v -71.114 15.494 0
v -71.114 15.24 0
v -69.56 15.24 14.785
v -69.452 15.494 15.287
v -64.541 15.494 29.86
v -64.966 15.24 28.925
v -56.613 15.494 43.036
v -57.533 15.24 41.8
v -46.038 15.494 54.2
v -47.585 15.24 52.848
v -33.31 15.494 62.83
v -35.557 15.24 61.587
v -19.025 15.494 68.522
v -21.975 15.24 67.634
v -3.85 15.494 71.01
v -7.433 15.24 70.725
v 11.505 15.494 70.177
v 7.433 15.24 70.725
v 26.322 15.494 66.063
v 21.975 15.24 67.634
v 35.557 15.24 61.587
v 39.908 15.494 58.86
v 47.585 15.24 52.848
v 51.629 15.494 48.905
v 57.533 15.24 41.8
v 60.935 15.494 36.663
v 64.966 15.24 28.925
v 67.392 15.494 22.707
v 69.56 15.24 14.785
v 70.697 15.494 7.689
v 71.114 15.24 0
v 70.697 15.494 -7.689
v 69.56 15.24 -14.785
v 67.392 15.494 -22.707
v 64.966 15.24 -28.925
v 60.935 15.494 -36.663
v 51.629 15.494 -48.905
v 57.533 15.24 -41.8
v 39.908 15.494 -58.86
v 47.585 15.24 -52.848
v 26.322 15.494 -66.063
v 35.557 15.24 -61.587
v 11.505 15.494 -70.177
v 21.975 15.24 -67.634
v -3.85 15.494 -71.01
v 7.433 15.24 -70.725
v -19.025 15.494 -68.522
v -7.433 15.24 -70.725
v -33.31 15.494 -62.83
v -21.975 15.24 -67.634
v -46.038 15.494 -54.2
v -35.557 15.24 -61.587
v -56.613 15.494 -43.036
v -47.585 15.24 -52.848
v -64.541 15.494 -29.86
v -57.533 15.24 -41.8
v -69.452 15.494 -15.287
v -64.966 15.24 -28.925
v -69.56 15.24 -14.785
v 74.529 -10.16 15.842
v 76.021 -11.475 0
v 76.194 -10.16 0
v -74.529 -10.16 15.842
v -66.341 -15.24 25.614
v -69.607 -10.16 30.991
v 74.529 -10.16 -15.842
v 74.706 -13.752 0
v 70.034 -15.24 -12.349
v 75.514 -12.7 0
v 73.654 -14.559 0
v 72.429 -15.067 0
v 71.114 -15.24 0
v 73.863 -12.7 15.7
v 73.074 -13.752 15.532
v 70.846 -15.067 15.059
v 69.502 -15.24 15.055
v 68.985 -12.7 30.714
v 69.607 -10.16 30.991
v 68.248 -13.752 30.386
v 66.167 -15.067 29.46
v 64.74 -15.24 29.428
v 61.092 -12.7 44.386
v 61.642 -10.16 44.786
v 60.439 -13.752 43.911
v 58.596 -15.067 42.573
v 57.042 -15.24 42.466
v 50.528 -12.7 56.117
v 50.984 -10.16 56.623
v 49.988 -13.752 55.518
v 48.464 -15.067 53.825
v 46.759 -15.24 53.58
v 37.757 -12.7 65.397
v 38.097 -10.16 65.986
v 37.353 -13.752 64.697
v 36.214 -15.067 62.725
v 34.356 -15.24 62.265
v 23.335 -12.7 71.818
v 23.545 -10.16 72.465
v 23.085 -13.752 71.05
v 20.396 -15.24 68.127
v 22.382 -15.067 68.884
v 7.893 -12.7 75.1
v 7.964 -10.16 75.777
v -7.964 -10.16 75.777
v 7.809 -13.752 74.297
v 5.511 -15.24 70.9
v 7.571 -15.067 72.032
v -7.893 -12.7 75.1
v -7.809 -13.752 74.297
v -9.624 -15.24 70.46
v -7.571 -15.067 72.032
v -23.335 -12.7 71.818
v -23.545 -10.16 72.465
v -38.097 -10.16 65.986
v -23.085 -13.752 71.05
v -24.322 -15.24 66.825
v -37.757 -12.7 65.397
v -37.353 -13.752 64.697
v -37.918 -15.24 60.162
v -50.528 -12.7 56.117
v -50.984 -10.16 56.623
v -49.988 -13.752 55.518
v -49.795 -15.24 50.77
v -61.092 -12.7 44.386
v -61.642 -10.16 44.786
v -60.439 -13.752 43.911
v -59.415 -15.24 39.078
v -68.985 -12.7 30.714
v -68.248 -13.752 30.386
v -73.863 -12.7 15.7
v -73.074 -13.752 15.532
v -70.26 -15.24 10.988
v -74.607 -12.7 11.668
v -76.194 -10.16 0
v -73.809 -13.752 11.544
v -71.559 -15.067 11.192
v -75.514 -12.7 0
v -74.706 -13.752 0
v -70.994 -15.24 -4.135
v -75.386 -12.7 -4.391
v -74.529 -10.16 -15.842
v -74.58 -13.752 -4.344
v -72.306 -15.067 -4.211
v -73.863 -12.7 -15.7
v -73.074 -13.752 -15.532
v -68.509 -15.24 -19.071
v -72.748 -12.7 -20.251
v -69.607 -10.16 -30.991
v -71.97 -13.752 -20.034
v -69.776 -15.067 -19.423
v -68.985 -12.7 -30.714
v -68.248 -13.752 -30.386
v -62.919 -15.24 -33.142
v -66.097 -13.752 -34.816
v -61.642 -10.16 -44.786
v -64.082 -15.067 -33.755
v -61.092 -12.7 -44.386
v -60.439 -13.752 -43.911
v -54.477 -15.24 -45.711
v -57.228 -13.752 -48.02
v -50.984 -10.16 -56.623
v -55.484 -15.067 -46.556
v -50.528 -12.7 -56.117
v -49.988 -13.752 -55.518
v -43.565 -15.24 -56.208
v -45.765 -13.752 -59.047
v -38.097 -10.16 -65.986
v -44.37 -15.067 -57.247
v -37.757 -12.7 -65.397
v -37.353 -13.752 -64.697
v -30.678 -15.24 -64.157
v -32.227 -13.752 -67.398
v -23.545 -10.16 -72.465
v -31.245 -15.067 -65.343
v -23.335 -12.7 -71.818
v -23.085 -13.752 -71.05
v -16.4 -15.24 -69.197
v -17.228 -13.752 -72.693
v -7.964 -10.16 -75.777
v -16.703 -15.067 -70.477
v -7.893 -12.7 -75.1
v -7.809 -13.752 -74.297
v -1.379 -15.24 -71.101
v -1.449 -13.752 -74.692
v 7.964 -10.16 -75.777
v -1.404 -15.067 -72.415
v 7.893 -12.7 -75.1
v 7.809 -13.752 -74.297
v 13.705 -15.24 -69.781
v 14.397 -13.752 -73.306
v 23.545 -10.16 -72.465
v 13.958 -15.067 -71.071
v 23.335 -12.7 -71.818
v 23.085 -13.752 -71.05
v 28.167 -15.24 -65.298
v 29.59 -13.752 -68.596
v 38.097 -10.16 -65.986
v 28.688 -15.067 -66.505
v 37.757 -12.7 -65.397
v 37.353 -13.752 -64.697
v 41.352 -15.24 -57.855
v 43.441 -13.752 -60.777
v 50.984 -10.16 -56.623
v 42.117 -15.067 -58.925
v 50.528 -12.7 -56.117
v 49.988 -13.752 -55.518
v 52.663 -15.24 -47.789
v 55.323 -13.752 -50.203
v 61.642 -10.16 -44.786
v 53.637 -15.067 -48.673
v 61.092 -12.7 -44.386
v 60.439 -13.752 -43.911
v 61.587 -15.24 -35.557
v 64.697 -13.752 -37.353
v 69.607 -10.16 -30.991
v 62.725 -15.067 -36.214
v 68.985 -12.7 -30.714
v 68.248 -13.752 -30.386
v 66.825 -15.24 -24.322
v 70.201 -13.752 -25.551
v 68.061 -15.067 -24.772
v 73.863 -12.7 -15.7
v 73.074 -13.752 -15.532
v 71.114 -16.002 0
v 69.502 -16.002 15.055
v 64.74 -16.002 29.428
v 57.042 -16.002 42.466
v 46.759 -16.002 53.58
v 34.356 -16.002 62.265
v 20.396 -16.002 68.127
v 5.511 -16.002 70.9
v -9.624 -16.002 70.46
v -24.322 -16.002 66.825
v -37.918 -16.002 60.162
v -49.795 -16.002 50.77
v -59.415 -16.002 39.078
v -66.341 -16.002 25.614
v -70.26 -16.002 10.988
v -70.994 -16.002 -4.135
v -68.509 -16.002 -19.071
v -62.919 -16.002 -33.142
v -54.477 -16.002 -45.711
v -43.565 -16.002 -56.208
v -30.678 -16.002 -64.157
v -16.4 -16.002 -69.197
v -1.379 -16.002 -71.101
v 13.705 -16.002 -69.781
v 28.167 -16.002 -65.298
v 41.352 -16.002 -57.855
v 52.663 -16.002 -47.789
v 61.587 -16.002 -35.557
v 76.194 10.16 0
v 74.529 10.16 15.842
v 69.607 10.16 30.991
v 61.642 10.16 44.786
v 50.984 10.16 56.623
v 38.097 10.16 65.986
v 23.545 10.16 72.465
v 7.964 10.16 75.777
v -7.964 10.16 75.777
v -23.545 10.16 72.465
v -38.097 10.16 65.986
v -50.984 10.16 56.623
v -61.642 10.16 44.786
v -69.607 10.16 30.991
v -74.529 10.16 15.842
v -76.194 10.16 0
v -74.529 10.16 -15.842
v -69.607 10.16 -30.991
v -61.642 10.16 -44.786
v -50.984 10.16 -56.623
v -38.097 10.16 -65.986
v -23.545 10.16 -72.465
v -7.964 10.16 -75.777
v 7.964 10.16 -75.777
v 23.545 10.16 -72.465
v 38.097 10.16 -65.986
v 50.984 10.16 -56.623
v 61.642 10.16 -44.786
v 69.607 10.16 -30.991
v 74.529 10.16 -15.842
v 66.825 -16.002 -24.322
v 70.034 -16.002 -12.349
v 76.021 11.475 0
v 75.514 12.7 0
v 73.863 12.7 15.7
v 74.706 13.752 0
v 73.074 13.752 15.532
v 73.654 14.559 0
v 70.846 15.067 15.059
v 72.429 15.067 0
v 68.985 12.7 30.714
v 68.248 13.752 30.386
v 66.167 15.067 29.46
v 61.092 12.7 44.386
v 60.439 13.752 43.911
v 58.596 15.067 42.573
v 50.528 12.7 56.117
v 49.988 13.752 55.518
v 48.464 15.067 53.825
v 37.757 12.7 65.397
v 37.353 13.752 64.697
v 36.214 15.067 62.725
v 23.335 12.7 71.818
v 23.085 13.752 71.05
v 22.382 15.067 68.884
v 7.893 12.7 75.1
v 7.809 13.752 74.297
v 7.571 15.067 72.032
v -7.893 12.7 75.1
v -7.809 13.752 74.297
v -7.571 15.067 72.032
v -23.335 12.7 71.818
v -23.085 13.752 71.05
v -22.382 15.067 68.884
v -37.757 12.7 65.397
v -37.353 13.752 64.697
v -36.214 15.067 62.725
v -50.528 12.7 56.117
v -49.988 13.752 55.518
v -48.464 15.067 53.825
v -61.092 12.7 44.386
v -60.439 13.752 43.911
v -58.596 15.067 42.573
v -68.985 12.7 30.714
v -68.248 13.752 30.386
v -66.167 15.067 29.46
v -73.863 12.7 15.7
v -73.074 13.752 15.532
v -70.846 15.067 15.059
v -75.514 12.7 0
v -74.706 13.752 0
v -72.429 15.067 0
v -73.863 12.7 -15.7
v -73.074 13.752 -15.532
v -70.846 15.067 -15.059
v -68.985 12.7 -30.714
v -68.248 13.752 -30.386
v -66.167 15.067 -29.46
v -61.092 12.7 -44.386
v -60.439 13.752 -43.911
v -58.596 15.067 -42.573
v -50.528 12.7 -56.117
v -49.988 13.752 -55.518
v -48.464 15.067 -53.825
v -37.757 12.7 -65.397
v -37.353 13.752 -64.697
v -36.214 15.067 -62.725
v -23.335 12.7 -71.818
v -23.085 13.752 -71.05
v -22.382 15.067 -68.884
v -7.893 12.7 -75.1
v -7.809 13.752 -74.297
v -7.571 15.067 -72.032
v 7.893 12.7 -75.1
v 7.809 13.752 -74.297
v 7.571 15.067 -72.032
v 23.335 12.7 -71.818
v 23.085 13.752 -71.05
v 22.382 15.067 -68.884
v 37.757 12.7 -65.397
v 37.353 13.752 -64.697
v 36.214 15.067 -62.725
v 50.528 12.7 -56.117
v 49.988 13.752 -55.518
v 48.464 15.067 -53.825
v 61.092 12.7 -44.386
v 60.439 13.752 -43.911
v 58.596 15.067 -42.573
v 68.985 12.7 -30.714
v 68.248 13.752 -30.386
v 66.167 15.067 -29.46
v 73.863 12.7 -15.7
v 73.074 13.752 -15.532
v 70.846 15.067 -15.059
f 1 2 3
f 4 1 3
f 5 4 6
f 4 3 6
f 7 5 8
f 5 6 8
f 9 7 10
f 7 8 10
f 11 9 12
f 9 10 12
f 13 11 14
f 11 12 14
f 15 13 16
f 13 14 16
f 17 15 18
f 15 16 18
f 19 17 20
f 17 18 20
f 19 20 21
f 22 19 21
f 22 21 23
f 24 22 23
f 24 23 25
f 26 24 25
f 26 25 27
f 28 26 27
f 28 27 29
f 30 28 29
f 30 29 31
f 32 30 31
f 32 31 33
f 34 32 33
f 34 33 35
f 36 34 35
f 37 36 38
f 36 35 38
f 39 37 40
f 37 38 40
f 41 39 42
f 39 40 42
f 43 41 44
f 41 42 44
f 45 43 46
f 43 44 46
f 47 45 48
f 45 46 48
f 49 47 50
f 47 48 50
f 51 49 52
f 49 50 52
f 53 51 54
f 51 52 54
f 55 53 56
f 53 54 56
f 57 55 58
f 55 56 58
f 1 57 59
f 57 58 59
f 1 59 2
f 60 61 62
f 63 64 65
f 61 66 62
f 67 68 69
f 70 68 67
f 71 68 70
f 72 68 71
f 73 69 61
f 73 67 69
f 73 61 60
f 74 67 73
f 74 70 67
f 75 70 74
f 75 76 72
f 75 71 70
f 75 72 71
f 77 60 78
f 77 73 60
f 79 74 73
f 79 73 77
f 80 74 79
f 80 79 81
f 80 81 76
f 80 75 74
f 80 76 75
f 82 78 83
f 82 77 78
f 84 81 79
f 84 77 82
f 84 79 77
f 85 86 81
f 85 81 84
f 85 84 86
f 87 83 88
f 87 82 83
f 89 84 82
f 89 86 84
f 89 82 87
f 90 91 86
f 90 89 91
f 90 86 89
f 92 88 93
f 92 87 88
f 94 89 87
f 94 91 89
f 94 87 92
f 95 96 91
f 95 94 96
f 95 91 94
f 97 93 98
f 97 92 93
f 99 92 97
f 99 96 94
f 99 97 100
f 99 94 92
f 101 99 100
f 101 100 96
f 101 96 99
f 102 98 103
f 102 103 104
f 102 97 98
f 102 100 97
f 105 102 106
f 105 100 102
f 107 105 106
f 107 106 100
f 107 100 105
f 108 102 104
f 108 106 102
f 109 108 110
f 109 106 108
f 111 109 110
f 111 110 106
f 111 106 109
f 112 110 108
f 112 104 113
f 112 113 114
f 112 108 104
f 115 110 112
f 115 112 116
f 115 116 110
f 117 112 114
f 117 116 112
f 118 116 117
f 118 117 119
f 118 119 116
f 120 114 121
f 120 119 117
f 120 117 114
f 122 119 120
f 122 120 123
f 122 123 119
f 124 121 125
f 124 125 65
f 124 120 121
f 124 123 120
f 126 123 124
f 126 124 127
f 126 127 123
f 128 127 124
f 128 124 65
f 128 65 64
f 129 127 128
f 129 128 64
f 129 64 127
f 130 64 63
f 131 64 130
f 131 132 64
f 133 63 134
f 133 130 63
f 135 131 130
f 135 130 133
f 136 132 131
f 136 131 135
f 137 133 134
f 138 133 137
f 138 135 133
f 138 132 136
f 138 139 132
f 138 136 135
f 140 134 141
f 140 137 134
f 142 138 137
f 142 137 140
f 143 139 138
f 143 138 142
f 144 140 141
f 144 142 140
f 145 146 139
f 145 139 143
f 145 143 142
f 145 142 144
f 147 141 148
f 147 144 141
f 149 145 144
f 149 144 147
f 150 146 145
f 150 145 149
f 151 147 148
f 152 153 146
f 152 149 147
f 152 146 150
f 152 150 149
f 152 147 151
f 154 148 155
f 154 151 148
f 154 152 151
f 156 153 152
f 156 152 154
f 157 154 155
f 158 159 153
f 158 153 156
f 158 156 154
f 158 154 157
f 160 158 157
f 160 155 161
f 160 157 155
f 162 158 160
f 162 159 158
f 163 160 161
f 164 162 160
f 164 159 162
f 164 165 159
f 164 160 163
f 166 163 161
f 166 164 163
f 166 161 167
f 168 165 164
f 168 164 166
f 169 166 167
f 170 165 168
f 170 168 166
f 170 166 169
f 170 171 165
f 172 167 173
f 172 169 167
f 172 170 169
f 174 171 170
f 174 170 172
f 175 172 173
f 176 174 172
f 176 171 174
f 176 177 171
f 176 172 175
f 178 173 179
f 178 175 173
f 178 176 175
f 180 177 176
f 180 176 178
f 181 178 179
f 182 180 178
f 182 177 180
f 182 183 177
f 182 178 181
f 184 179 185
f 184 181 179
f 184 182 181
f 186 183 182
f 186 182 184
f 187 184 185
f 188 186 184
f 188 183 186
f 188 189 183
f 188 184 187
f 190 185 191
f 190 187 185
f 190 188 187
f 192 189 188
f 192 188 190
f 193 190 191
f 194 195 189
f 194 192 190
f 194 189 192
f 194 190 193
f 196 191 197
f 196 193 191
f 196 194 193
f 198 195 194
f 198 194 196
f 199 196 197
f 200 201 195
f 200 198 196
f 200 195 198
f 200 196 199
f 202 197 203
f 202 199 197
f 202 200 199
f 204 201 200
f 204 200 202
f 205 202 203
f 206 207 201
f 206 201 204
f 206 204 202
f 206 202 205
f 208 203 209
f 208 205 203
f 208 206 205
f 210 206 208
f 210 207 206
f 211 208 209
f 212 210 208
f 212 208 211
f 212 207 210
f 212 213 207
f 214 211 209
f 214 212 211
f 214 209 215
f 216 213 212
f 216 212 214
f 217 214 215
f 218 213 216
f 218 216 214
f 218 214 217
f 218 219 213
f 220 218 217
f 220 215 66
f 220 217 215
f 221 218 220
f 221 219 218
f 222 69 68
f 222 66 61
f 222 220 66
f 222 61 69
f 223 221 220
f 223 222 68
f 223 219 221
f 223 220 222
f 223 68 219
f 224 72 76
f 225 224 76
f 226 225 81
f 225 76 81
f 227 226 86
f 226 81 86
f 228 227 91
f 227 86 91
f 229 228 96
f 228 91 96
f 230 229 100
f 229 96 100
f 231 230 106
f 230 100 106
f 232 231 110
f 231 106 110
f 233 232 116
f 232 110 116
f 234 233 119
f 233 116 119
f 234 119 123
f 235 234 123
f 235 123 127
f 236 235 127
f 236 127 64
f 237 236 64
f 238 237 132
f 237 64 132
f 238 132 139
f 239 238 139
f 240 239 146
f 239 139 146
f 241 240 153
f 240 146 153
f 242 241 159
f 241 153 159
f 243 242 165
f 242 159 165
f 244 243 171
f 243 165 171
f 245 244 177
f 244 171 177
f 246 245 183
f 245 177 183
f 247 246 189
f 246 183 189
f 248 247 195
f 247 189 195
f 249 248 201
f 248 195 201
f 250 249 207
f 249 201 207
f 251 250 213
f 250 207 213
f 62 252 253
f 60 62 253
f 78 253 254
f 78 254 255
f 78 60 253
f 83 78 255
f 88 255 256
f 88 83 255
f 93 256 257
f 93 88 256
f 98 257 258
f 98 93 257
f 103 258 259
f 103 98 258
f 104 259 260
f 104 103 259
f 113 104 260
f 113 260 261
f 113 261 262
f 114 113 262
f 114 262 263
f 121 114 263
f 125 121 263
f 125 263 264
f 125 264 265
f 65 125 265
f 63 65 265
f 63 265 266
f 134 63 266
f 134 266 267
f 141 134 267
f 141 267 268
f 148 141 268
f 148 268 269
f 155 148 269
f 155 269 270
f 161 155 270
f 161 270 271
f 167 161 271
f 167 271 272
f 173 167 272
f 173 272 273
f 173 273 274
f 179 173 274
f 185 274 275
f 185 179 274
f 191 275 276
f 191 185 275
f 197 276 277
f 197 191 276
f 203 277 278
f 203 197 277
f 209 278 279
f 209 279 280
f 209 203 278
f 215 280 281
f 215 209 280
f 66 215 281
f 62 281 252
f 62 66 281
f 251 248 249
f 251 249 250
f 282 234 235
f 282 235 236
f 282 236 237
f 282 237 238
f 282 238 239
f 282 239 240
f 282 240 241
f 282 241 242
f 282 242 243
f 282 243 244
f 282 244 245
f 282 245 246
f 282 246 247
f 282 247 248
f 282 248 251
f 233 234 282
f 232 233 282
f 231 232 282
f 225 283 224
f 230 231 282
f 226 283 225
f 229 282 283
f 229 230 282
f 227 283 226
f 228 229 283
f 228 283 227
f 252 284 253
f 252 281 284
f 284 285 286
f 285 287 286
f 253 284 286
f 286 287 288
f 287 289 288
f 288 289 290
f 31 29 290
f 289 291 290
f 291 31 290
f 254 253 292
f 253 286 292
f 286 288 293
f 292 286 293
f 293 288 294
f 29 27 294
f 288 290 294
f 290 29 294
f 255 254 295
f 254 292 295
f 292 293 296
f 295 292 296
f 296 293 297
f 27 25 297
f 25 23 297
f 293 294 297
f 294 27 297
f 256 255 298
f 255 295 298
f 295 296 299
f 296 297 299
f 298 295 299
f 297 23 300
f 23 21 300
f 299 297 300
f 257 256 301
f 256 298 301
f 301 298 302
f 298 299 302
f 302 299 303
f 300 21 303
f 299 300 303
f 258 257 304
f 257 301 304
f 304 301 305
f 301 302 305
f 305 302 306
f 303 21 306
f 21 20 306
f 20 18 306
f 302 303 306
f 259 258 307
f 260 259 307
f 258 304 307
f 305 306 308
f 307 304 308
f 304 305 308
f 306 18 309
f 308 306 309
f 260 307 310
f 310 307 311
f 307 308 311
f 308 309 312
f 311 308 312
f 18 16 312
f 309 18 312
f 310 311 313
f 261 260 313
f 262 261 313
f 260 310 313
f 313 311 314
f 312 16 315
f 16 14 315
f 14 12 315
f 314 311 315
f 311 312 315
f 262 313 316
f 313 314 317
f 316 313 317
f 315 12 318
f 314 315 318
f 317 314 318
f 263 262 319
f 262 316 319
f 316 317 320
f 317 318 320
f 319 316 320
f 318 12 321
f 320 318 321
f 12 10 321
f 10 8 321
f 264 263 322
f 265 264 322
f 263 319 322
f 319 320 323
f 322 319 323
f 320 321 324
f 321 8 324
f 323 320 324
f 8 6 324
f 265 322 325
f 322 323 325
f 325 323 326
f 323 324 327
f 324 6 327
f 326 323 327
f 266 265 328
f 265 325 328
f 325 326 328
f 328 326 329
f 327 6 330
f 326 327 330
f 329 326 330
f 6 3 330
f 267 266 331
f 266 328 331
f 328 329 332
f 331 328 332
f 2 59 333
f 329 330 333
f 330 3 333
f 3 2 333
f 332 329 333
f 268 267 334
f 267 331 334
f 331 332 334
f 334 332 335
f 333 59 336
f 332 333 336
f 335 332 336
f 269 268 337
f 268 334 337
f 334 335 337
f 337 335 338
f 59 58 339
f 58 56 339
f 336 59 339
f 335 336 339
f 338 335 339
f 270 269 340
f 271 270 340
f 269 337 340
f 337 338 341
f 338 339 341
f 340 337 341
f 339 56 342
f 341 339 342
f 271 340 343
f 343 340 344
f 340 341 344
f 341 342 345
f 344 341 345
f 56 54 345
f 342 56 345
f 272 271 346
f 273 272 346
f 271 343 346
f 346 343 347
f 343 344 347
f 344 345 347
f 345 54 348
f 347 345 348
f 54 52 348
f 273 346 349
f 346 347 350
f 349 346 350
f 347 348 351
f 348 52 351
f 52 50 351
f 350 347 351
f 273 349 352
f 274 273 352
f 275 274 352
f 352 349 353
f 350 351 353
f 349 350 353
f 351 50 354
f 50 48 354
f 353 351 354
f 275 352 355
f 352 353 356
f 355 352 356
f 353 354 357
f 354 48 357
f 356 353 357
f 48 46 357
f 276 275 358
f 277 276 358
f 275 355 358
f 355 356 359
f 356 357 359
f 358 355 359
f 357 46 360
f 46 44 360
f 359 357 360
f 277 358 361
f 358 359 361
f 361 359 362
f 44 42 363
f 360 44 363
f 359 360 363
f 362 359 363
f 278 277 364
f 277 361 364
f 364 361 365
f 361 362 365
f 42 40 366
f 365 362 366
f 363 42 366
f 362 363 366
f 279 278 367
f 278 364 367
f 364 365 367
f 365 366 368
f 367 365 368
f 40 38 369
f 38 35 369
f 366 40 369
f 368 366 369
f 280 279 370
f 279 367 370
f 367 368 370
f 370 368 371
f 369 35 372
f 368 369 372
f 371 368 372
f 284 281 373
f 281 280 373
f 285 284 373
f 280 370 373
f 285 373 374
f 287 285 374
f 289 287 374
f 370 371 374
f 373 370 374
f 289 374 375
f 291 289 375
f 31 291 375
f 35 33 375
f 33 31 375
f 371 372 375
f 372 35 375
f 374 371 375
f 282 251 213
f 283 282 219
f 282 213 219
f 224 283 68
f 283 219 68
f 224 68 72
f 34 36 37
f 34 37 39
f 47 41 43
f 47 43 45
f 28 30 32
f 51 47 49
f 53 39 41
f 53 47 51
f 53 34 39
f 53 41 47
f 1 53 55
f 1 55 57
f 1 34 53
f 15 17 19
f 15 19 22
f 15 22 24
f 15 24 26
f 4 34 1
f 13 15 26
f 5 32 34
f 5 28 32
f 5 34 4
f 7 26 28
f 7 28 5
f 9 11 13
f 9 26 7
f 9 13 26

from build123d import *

# Parameters (mm, degrees)
F0_R     = 76.194135209
F1_DEPTH = 15.24
F2_DEPTH = 15.24
F3_R     = 5.08
F5_DEPTH = 0.762
F6_R     = 71.114135209
F7_DEPTH = 0.254


with BuildPart() as f1:
    # F0 (on Front) → F1 (new body)
    with BuildSketch(Plane.XZ):
        Circle(F0_R)
    extrude(amount=F1_DEPTH)

    # F2 (add): a face of the model
    f2_faces = [f1.faces().sort_by_distance(p)[0] for p in [
        (0, 0, 0),
    ]]
    extrude(f2_faces, amount=F2_DEPTH)

    # F3
    f3_edges = [f1.edges().sort_by_distance(p)[0] for p in [
        (76.194135, -7.62, 0),
        (-76.194135, 0, 0),
        (-76.194135, -15.24, 0),
        (76.194135, 7.62, 0),
        (-76.194135, 15.24, 0),
    ]]
    fillet(f3_edges, radius=F3_R)

    # F4 (on face) → F5 (join)
    with BuildSketch(Plane.XZ.offset(15.24)):
        with BuildLine():
            Line((61.5866476591, -35.5570676045), (0, 0))
            Line((0, 0), (-61.5866476591, -35.5570676045))
            ThreePointArc((-61.5866476591, -35.5570676045), (0, -71.114135209), (61.5866476591, -35.5570676045))
        make_face()
        with BuildLine():
            Line((-61.5866476591, -35.5570676045), (0, 0))
            Line((0, 0), (0, 71.114135209))
            ThreePointArc((0, 71.114135209), (-61.5866476591, 35.5570676045), (-61.5866476591, -35.5570676045))
        make_face()
        with BuildLine():
            Line((0, 71.114135209), (0, 0))
            Line((0, 0), (61.5866476591, -35.5570676045))
            ThreePointArc((61.5866476591, -35.5570676045), (68.6909798125, -18.4056925681), (71.114135209, 0))
            ThreePointArc((71.114135209, 0), (50.2852872445, 50.2852872445), (0, 71.114135209))
        make_face()
    extrude(amount=F5_DEPTH)

    # F6 (on face) → F7 (join)
    with BuildSketch(Plane(origin=(0, 15.24, 0), x_dir=(-1, 0, 0), z_dir=(0, 1, 0))):
        Circle(F6_R)
    extrude(amount=F7_DEPTH)


solid = f1.part
